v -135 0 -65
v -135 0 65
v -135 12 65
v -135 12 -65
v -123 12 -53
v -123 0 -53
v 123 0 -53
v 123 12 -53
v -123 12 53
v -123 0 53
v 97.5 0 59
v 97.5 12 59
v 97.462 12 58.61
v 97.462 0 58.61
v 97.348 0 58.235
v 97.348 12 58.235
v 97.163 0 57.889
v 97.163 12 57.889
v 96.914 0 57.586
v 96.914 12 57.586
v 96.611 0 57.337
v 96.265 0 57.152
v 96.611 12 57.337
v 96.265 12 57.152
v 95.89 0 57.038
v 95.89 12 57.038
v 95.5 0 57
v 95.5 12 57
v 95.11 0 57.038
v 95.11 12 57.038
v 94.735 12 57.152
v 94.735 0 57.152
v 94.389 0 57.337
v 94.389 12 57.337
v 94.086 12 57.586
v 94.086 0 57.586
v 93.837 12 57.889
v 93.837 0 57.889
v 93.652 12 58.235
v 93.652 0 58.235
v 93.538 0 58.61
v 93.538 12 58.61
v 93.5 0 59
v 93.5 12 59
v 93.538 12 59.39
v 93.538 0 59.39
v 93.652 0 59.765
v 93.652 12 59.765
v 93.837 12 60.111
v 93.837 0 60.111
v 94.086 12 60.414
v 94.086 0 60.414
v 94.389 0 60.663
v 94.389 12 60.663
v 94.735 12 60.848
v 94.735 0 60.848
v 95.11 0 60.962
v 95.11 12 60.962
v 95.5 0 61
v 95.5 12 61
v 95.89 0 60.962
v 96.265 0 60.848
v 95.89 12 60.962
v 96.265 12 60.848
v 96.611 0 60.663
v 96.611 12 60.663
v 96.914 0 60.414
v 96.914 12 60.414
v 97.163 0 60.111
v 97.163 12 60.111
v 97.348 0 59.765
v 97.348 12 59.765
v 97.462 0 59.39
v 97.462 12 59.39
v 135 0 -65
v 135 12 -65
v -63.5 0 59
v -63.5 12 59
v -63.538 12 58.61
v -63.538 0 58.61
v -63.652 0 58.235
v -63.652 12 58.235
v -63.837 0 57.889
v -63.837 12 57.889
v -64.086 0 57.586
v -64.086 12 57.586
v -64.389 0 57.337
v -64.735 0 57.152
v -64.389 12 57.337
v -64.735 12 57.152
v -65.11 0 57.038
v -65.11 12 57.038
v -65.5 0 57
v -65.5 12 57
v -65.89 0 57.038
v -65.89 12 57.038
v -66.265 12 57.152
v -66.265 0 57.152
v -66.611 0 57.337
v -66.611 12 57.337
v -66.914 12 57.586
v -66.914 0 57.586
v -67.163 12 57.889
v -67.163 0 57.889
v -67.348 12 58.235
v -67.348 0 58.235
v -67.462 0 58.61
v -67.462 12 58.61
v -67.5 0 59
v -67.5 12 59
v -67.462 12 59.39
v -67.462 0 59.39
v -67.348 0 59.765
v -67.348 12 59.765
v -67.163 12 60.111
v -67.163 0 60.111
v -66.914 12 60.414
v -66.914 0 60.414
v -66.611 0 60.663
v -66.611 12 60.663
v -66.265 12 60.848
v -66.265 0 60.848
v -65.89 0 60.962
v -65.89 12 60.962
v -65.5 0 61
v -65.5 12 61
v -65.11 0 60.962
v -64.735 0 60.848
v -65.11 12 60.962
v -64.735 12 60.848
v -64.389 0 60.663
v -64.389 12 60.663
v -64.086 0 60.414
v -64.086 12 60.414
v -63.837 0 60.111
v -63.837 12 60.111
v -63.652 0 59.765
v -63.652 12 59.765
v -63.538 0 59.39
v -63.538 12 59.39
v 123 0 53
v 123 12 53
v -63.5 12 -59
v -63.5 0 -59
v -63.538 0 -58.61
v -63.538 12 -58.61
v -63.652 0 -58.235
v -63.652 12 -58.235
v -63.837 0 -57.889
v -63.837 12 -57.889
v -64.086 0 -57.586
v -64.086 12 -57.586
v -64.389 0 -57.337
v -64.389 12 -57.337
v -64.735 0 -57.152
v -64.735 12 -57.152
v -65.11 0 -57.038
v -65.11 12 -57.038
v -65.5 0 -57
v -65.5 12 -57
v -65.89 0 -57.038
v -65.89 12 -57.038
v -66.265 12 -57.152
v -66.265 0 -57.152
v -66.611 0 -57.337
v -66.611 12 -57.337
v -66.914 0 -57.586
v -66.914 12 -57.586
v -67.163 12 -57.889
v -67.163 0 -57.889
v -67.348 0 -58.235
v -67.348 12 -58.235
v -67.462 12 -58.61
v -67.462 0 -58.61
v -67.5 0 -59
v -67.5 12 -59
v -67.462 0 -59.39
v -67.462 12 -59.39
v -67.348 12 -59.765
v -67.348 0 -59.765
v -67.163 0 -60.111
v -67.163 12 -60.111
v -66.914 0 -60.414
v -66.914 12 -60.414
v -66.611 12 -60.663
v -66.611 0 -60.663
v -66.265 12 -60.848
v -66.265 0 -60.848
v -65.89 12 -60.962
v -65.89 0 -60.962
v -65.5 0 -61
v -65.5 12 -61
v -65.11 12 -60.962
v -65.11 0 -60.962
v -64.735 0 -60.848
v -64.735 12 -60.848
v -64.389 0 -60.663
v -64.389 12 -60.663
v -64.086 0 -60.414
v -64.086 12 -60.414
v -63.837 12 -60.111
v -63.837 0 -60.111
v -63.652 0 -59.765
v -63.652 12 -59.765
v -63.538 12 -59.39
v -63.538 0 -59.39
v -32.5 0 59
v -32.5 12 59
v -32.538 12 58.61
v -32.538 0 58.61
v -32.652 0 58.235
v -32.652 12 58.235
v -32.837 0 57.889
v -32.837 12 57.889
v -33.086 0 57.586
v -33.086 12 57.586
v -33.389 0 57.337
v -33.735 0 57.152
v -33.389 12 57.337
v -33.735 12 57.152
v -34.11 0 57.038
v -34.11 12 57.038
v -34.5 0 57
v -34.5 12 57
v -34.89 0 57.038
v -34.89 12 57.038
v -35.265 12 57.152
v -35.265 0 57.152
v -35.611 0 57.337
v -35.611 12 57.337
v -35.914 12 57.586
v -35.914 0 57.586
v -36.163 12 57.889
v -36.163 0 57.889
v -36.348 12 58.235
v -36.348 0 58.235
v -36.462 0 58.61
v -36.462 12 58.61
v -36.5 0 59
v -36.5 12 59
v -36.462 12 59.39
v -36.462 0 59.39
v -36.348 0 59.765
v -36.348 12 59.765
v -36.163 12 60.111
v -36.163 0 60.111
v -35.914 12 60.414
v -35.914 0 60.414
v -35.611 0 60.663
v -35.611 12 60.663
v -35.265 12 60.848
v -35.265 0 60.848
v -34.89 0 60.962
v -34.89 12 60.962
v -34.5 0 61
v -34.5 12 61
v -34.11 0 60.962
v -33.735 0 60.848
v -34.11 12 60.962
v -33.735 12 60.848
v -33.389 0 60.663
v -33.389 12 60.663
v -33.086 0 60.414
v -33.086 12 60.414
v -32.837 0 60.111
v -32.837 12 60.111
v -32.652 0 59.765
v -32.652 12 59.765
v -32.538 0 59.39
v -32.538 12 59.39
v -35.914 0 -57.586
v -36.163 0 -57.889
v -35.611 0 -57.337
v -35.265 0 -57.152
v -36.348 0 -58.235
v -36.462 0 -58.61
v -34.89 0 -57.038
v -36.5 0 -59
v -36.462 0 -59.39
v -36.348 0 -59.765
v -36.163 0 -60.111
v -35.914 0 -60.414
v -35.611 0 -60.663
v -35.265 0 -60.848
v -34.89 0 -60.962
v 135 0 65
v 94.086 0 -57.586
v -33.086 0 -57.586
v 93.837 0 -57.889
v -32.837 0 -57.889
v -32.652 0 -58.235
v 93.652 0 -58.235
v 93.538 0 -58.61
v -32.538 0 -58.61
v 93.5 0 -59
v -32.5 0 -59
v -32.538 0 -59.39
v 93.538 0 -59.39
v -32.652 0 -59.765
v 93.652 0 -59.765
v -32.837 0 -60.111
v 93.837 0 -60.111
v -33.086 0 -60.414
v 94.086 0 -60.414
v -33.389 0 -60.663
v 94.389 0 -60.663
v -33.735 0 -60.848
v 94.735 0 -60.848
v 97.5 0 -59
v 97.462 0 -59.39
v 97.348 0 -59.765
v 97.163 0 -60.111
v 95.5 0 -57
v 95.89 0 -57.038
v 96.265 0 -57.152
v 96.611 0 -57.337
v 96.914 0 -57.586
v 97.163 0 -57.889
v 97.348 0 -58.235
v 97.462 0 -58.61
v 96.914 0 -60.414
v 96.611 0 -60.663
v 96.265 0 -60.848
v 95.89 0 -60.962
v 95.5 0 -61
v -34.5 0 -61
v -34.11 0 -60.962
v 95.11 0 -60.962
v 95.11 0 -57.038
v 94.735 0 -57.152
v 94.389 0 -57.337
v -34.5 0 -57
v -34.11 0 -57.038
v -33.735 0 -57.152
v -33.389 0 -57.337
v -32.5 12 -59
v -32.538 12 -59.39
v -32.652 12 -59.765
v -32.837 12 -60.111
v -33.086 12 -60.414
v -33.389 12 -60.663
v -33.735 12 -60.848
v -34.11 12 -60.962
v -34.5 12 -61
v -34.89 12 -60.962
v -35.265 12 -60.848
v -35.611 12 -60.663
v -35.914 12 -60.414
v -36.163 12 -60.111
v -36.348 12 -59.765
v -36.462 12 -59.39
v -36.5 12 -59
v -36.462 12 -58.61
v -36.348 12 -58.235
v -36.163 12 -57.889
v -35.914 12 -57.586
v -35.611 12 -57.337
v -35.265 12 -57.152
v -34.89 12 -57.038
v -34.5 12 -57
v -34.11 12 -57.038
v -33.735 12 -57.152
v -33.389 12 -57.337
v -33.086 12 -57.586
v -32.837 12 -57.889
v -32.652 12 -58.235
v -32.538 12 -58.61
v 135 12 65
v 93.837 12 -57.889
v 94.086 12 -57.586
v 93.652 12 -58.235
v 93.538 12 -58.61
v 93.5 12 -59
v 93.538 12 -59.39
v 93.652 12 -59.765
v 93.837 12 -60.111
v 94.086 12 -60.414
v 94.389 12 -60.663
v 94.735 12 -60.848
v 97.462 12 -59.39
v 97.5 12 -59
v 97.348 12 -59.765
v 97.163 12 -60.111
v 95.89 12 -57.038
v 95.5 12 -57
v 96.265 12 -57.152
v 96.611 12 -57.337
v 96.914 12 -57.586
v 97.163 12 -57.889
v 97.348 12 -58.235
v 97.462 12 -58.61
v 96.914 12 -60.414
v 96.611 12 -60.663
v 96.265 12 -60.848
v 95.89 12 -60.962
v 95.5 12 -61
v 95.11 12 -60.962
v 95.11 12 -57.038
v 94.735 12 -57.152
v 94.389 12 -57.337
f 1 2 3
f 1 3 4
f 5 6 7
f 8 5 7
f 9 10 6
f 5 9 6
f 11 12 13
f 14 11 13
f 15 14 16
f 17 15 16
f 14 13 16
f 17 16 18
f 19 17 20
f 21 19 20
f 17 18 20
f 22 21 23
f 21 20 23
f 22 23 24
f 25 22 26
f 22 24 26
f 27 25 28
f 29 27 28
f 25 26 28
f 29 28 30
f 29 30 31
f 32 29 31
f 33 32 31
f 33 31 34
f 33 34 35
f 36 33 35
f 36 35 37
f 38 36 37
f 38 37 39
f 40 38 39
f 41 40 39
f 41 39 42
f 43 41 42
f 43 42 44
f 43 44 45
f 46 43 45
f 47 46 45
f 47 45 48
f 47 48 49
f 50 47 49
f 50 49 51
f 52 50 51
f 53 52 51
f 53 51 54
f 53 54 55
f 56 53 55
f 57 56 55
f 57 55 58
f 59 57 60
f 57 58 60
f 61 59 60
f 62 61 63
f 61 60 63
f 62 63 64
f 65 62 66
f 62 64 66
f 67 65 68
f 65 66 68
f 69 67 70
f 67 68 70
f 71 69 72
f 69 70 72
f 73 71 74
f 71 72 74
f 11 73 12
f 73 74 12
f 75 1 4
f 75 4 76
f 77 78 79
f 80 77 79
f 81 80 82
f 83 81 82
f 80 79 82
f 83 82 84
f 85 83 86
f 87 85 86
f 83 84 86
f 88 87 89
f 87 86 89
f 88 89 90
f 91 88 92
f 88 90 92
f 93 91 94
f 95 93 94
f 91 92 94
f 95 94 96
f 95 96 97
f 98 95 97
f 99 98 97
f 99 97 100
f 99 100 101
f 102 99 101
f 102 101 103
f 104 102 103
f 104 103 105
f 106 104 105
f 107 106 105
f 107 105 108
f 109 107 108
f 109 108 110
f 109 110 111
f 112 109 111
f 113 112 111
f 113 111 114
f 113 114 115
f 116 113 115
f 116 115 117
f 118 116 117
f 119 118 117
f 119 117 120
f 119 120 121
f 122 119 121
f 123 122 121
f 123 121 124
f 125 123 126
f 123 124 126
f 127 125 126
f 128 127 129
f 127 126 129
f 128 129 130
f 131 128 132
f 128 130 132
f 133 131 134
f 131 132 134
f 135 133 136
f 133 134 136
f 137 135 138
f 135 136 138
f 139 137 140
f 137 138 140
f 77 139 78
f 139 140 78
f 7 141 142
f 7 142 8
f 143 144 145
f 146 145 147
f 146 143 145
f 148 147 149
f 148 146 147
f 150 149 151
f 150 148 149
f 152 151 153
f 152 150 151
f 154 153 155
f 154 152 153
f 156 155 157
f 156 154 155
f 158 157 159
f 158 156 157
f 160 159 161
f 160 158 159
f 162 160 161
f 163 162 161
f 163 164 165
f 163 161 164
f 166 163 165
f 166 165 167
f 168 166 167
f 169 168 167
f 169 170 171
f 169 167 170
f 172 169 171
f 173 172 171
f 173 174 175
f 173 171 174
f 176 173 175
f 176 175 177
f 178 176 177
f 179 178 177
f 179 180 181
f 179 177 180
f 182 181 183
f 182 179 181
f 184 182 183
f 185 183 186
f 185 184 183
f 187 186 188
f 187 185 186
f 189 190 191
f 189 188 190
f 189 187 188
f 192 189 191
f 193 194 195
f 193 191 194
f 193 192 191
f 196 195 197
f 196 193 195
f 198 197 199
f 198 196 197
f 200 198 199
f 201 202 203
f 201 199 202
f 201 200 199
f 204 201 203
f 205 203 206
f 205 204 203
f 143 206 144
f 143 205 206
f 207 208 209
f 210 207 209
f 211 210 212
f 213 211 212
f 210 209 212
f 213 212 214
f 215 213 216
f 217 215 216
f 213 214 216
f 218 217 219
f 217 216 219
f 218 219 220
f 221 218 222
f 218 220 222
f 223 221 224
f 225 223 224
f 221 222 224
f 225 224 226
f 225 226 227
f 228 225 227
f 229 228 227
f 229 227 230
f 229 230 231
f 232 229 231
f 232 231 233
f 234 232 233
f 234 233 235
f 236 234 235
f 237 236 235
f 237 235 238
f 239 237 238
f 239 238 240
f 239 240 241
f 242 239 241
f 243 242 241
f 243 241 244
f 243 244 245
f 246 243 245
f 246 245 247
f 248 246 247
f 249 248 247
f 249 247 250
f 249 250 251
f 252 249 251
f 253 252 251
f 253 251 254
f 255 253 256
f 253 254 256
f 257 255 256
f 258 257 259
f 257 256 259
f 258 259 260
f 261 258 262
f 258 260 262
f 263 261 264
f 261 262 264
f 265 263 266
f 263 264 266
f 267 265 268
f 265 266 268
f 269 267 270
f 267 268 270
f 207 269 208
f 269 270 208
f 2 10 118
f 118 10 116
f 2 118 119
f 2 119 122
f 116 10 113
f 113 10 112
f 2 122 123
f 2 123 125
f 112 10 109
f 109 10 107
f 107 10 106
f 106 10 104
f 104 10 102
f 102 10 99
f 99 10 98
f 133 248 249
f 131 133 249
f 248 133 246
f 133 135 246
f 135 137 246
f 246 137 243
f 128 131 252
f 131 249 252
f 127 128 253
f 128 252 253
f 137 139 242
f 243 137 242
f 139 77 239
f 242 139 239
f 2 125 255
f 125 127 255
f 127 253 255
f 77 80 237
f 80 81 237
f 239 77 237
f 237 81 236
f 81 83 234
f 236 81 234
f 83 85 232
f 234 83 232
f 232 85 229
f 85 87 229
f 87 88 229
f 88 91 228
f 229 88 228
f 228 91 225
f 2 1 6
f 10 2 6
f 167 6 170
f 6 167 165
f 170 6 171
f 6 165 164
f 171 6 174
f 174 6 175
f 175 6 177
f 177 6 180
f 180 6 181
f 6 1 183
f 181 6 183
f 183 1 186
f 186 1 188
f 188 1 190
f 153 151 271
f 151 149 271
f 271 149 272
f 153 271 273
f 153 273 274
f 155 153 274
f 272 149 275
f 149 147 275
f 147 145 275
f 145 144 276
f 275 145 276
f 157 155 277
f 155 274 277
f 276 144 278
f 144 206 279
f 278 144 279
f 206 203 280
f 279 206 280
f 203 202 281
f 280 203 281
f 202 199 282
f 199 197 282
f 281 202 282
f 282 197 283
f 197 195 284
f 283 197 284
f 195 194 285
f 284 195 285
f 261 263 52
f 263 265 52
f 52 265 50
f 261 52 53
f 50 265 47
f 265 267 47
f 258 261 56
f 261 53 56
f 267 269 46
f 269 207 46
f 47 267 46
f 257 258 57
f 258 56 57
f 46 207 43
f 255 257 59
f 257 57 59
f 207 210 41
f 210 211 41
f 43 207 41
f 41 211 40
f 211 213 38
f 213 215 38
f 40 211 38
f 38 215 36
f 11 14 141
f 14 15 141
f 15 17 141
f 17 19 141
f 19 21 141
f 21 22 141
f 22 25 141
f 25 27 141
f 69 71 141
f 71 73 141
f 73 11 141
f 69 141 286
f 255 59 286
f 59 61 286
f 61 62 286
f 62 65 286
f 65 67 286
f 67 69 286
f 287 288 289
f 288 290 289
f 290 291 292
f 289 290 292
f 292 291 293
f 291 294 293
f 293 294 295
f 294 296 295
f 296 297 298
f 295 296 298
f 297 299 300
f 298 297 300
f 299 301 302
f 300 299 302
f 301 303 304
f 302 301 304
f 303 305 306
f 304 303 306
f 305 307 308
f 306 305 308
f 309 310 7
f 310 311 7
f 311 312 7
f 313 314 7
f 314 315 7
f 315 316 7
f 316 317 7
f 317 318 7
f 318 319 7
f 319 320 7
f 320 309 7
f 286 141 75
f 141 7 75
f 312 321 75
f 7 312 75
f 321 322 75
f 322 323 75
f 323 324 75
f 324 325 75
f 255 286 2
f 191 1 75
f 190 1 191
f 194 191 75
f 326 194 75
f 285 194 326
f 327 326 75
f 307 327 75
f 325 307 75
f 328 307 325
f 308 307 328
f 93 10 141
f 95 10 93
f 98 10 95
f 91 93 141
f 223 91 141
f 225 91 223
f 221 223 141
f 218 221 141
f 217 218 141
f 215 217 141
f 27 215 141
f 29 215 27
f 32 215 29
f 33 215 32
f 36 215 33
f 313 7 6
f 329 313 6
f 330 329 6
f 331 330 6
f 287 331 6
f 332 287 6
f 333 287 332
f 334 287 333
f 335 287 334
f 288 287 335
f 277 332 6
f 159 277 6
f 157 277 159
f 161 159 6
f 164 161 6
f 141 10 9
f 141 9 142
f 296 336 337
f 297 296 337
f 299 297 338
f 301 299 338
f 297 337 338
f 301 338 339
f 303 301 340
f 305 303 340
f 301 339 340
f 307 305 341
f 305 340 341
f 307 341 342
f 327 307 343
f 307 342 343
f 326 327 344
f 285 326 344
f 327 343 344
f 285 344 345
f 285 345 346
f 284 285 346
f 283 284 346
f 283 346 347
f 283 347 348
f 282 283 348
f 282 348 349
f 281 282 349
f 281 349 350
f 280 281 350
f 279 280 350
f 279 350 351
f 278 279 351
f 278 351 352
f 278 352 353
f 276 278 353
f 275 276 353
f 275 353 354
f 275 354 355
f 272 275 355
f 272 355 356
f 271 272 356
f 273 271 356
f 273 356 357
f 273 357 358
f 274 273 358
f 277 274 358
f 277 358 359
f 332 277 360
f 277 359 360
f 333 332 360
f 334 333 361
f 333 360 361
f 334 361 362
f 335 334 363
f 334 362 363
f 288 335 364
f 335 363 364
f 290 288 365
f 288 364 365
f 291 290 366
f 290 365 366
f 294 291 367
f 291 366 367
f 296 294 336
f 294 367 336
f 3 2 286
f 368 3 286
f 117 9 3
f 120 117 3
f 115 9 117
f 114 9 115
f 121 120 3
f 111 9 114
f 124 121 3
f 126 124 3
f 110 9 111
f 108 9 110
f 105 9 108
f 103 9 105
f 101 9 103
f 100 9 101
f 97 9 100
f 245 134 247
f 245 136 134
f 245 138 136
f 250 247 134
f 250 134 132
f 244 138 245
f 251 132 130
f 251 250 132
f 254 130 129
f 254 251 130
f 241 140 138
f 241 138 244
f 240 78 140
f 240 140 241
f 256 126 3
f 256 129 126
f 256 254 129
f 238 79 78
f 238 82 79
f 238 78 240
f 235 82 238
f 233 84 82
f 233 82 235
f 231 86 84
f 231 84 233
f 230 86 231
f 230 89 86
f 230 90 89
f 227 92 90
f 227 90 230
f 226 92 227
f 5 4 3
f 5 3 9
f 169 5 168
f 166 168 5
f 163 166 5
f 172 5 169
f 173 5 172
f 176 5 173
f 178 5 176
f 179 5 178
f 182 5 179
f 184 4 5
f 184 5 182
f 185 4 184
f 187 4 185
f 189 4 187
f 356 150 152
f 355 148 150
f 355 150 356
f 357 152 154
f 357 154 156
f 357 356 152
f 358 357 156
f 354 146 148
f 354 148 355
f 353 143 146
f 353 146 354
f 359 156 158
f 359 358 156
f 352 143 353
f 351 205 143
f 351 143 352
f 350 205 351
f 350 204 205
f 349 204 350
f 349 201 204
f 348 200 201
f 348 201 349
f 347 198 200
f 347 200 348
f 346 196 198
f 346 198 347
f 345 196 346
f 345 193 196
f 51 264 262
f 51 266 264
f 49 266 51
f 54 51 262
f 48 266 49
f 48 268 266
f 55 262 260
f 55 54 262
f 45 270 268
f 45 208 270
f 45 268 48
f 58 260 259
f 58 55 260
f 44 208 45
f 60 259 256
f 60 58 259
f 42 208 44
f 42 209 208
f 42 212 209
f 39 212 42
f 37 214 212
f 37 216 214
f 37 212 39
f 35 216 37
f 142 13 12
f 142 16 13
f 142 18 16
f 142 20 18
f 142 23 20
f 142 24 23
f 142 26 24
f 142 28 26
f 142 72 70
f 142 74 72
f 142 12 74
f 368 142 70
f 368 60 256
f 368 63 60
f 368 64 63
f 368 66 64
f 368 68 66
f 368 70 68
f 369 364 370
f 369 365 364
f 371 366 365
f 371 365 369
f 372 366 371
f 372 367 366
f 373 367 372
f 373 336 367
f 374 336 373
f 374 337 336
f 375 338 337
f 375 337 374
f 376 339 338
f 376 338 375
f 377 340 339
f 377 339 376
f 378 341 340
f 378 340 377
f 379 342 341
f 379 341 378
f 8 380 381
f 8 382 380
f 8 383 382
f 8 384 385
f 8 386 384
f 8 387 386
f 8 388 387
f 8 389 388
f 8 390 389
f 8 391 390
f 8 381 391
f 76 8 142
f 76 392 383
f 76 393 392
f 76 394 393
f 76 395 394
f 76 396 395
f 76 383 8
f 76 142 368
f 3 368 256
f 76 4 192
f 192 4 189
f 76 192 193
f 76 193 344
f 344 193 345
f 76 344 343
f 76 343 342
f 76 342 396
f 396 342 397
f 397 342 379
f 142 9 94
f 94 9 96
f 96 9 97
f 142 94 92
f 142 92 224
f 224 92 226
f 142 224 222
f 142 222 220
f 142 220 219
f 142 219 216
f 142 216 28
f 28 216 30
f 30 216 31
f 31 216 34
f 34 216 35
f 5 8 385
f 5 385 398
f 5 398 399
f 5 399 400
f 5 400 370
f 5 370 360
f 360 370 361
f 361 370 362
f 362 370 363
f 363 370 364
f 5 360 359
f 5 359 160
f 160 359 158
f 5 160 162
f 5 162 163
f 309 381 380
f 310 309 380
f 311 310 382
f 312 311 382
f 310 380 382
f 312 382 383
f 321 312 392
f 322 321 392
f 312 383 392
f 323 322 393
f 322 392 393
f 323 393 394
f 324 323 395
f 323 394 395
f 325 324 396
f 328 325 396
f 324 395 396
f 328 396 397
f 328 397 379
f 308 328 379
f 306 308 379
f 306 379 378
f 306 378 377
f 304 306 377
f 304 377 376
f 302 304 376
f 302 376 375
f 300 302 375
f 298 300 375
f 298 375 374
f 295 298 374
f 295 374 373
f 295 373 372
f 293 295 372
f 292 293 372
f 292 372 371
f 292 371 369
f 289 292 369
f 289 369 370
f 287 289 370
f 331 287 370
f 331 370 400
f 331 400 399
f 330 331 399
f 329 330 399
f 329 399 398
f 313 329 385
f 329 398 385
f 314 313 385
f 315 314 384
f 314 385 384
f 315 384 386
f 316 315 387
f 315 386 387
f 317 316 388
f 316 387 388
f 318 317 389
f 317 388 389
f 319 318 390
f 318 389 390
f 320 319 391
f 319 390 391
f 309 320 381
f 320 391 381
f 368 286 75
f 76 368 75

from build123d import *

# Parameters (mm, degrees)
SKETCH1_W                 = 270
SKETCH1_H                 = 130
SKETCH1_W_2               = 246
SKETCH1_H_2               = 106
BOSS_EXTRUDE1_DEPTH       = 12
SKETCH3_R                 = 2
CUT_EXTRUDE1_DEPTH        = 50.25
LPATTERN1_COUNT           = 2
LPATTERN1_PITCH           = 31
LPATTERN1_COPY_1_SKETCH_R = 2
LPATTERN1_COPY_1_DEPTH    = 50.25
LPATTERN2_COUNT           = 2
LPATTERN2_PITCH           = 161
MIRROR2_COPY_1_SKETCH_R   = 2
MIRROR2_COPY_1_DEPTH      = 50.25
MIRROR2_COPY_2_SKETCH_R   = 2
MIRROR2_COPY_2_DEPTH      = 50.25


with BuildPart() as part:
    # Sketch1 → Boss-Extrude1 (new body)
    with BuildSketch(Plane(origin=(0, 0, 0), x_dir=(1, 0, 0), z_dir=(0, 1, 0))):
        Rectangle(SKETCH1_W, SKETCH1_H)
        Rectangle(SKETCH1_W_2, SKETCH1_H_2, mode=Mode.SUBTRACT)
    extrude(amount=BOSS_EXTRUDE1_DEPTH)

    # Sketch3 → Cut-Extrude1 (cut)
    with BuildSketch(Plane(origin=(0, 12, 0), x_dir=(1, 0, 0), z_dir=(0, 1, 0))):
        with Locations((-65.5, -59)):
            Circle(SKETCH3_R)
    cut_extrude1 = extrude(amount=-CUT_EXTRUDE1_DEPTH, mode=Mode.SUBTRACT)

    # Mirror1: Cut-Extrude1 across plane
    add(cut_extrude1.mirror(Plane.XY), mode=Mode.SUBTRACT)

    # LPattern1: Cut-Extrude1 ×2
    with Locations(*[(i * LPATTERN1_PITCH, 0, 0) for i in range(1, LPATTERN1_COUNT)]):
        add(cut_extrude1, mode=Mode.SUBTRACT)

    # LPattern1 copy 1 sketch → LPattern1 copy 1 (cut)
    with BuildSketch(Plane(origin=(31, 12, 0), x_dir=(1, 0, 0), z_dir=(0, 1, 0))):
        with Locations((-65.5, 59)):
            Circle(LPATTERN1_COPY_1_SKETCH_R)
    extrude(amount=-LPATTERN1_COPY_1_DEPTH, mode=Mode.SUBTRACT)

    # LPattern2: Cut-Extrude1 ×2
    with Locations(*[(i * LPATTERN2_PITCH, 0, 0) for i in range(1, LPATTERN2_COUNT)]):
        add(cut_extrude1, mode=Mode.SUBTRACT)

    # Mirror2 copy 1 sketch → Mirror2 copy 1 (cut)
    with BuildSketch(Plane(origin=(161, 12, 0), x_dir=(1, 0, 0), z_dir=(0, 1, 0))):
        with Locations((-65.5, 59)):
            Circle(MIRROR2_COPY_1_SKETCH_R)
    extrude(amount=-MIRROR2_COPY_1_DEPTH, mode=Mode.SUBTRACT)

    # Mirror2 copy 2 sketch → Mirror2 copy 2 (cut)
    with BuildSketch(Plane(origin=(0, 12, 0), x_dir=(1, 0, 0), z_dir=(0, 1, 0))):
        with Locations((-65.5, 59)):
            Circle(MIRROR2_COPY_2_SKETCH_R)
    extrude(amount=-MIRROR2_COPY_2_DEPTH, mode=Mode.SUBTRACT)


solid = part.part
